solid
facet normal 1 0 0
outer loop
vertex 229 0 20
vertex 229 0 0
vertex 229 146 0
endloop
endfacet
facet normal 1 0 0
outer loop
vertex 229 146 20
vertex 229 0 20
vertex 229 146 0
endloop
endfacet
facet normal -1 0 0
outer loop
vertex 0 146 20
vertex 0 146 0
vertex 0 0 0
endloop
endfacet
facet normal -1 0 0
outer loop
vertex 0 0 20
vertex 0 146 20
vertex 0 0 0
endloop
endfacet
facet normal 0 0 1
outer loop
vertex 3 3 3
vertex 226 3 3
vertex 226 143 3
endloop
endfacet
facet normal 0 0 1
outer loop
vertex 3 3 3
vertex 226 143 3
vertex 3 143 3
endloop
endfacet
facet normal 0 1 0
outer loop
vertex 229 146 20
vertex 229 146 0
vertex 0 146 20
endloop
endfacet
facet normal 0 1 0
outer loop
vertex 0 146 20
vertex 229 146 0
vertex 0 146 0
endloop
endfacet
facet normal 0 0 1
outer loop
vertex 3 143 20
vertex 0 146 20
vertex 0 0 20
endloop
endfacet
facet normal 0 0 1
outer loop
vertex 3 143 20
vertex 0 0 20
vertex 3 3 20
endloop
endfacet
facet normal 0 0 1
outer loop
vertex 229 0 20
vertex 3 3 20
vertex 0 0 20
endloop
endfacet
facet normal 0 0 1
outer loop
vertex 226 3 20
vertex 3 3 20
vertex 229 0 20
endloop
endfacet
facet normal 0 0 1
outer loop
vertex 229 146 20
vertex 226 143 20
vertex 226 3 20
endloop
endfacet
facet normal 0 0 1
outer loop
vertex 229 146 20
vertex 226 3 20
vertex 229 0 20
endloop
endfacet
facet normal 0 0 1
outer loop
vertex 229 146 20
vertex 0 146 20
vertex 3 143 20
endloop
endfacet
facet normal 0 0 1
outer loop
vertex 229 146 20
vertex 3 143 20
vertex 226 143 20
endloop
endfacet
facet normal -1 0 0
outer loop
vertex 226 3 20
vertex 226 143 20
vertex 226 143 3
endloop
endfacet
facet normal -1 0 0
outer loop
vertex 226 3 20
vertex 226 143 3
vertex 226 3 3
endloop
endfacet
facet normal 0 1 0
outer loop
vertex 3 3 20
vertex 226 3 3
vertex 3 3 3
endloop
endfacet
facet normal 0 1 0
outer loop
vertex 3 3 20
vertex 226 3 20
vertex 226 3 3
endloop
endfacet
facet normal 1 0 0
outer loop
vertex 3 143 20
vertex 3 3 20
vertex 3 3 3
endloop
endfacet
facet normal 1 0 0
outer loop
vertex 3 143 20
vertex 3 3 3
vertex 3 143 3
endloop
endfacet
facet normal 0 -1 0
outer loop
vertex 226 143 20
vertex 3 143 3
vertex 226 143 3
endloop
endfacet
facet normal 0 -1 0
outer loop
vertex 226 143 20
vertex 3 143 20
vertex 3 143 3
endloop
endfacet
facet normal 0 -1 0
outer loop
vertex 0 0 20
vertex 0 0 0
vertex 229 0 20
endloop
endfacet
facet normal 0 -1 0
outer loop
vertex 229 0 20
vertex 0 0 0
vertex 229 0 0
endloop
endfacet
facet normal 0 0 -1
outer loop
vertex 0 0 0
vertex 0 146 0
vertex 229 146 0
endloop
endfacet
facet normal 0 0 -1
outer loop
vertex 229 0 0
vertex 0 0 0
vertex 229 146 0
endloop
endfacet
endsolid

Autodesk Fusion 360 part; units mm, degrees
sketch "Sketch1" plane through (0, 0, 0) normal (0, 0, 1) x (1, 0, 0)
  line L0 (0, 0) -> (229, 0)
  line L1 (229, 0) -> (229, 146)
  line L2 (229, 146) -> (0, 146)
  line L3 (0, 146) -> (0, 0)
  dimension "d1" = 229
  dimension "d2" = 146
extrude "Extrude1" add sketch "Sketch1" along normal blind 20
sketch "Sketch2" plane through (0, 0, 20) normal (0, 0, 1) x (-1, 0, 0)
  line L0 (0, -146) -> (0, 0)
  line L1 (0, 0) -> (-229, 0)
  line L2 (-229, 0) -> (-229, -146)
  line L3 (-229, -146) -> (0, -146)
  line L4 (-3, -143) -> (-226, -143)
  line L5 (-226, -143) -> (-226, -3)
  line L6 (-226, -3) -> (-3, -3)
  line L7 (-3, -3) -> (-3, -143)
  dimension "d5" = 3
  dimension "d6" = 3
  dimension "d7" = 3
  dimension "d8" = 3
extrude "Extrude2" cut sketch "Sketch2" against normal blind 17 contours L4 L5 L6 L7
